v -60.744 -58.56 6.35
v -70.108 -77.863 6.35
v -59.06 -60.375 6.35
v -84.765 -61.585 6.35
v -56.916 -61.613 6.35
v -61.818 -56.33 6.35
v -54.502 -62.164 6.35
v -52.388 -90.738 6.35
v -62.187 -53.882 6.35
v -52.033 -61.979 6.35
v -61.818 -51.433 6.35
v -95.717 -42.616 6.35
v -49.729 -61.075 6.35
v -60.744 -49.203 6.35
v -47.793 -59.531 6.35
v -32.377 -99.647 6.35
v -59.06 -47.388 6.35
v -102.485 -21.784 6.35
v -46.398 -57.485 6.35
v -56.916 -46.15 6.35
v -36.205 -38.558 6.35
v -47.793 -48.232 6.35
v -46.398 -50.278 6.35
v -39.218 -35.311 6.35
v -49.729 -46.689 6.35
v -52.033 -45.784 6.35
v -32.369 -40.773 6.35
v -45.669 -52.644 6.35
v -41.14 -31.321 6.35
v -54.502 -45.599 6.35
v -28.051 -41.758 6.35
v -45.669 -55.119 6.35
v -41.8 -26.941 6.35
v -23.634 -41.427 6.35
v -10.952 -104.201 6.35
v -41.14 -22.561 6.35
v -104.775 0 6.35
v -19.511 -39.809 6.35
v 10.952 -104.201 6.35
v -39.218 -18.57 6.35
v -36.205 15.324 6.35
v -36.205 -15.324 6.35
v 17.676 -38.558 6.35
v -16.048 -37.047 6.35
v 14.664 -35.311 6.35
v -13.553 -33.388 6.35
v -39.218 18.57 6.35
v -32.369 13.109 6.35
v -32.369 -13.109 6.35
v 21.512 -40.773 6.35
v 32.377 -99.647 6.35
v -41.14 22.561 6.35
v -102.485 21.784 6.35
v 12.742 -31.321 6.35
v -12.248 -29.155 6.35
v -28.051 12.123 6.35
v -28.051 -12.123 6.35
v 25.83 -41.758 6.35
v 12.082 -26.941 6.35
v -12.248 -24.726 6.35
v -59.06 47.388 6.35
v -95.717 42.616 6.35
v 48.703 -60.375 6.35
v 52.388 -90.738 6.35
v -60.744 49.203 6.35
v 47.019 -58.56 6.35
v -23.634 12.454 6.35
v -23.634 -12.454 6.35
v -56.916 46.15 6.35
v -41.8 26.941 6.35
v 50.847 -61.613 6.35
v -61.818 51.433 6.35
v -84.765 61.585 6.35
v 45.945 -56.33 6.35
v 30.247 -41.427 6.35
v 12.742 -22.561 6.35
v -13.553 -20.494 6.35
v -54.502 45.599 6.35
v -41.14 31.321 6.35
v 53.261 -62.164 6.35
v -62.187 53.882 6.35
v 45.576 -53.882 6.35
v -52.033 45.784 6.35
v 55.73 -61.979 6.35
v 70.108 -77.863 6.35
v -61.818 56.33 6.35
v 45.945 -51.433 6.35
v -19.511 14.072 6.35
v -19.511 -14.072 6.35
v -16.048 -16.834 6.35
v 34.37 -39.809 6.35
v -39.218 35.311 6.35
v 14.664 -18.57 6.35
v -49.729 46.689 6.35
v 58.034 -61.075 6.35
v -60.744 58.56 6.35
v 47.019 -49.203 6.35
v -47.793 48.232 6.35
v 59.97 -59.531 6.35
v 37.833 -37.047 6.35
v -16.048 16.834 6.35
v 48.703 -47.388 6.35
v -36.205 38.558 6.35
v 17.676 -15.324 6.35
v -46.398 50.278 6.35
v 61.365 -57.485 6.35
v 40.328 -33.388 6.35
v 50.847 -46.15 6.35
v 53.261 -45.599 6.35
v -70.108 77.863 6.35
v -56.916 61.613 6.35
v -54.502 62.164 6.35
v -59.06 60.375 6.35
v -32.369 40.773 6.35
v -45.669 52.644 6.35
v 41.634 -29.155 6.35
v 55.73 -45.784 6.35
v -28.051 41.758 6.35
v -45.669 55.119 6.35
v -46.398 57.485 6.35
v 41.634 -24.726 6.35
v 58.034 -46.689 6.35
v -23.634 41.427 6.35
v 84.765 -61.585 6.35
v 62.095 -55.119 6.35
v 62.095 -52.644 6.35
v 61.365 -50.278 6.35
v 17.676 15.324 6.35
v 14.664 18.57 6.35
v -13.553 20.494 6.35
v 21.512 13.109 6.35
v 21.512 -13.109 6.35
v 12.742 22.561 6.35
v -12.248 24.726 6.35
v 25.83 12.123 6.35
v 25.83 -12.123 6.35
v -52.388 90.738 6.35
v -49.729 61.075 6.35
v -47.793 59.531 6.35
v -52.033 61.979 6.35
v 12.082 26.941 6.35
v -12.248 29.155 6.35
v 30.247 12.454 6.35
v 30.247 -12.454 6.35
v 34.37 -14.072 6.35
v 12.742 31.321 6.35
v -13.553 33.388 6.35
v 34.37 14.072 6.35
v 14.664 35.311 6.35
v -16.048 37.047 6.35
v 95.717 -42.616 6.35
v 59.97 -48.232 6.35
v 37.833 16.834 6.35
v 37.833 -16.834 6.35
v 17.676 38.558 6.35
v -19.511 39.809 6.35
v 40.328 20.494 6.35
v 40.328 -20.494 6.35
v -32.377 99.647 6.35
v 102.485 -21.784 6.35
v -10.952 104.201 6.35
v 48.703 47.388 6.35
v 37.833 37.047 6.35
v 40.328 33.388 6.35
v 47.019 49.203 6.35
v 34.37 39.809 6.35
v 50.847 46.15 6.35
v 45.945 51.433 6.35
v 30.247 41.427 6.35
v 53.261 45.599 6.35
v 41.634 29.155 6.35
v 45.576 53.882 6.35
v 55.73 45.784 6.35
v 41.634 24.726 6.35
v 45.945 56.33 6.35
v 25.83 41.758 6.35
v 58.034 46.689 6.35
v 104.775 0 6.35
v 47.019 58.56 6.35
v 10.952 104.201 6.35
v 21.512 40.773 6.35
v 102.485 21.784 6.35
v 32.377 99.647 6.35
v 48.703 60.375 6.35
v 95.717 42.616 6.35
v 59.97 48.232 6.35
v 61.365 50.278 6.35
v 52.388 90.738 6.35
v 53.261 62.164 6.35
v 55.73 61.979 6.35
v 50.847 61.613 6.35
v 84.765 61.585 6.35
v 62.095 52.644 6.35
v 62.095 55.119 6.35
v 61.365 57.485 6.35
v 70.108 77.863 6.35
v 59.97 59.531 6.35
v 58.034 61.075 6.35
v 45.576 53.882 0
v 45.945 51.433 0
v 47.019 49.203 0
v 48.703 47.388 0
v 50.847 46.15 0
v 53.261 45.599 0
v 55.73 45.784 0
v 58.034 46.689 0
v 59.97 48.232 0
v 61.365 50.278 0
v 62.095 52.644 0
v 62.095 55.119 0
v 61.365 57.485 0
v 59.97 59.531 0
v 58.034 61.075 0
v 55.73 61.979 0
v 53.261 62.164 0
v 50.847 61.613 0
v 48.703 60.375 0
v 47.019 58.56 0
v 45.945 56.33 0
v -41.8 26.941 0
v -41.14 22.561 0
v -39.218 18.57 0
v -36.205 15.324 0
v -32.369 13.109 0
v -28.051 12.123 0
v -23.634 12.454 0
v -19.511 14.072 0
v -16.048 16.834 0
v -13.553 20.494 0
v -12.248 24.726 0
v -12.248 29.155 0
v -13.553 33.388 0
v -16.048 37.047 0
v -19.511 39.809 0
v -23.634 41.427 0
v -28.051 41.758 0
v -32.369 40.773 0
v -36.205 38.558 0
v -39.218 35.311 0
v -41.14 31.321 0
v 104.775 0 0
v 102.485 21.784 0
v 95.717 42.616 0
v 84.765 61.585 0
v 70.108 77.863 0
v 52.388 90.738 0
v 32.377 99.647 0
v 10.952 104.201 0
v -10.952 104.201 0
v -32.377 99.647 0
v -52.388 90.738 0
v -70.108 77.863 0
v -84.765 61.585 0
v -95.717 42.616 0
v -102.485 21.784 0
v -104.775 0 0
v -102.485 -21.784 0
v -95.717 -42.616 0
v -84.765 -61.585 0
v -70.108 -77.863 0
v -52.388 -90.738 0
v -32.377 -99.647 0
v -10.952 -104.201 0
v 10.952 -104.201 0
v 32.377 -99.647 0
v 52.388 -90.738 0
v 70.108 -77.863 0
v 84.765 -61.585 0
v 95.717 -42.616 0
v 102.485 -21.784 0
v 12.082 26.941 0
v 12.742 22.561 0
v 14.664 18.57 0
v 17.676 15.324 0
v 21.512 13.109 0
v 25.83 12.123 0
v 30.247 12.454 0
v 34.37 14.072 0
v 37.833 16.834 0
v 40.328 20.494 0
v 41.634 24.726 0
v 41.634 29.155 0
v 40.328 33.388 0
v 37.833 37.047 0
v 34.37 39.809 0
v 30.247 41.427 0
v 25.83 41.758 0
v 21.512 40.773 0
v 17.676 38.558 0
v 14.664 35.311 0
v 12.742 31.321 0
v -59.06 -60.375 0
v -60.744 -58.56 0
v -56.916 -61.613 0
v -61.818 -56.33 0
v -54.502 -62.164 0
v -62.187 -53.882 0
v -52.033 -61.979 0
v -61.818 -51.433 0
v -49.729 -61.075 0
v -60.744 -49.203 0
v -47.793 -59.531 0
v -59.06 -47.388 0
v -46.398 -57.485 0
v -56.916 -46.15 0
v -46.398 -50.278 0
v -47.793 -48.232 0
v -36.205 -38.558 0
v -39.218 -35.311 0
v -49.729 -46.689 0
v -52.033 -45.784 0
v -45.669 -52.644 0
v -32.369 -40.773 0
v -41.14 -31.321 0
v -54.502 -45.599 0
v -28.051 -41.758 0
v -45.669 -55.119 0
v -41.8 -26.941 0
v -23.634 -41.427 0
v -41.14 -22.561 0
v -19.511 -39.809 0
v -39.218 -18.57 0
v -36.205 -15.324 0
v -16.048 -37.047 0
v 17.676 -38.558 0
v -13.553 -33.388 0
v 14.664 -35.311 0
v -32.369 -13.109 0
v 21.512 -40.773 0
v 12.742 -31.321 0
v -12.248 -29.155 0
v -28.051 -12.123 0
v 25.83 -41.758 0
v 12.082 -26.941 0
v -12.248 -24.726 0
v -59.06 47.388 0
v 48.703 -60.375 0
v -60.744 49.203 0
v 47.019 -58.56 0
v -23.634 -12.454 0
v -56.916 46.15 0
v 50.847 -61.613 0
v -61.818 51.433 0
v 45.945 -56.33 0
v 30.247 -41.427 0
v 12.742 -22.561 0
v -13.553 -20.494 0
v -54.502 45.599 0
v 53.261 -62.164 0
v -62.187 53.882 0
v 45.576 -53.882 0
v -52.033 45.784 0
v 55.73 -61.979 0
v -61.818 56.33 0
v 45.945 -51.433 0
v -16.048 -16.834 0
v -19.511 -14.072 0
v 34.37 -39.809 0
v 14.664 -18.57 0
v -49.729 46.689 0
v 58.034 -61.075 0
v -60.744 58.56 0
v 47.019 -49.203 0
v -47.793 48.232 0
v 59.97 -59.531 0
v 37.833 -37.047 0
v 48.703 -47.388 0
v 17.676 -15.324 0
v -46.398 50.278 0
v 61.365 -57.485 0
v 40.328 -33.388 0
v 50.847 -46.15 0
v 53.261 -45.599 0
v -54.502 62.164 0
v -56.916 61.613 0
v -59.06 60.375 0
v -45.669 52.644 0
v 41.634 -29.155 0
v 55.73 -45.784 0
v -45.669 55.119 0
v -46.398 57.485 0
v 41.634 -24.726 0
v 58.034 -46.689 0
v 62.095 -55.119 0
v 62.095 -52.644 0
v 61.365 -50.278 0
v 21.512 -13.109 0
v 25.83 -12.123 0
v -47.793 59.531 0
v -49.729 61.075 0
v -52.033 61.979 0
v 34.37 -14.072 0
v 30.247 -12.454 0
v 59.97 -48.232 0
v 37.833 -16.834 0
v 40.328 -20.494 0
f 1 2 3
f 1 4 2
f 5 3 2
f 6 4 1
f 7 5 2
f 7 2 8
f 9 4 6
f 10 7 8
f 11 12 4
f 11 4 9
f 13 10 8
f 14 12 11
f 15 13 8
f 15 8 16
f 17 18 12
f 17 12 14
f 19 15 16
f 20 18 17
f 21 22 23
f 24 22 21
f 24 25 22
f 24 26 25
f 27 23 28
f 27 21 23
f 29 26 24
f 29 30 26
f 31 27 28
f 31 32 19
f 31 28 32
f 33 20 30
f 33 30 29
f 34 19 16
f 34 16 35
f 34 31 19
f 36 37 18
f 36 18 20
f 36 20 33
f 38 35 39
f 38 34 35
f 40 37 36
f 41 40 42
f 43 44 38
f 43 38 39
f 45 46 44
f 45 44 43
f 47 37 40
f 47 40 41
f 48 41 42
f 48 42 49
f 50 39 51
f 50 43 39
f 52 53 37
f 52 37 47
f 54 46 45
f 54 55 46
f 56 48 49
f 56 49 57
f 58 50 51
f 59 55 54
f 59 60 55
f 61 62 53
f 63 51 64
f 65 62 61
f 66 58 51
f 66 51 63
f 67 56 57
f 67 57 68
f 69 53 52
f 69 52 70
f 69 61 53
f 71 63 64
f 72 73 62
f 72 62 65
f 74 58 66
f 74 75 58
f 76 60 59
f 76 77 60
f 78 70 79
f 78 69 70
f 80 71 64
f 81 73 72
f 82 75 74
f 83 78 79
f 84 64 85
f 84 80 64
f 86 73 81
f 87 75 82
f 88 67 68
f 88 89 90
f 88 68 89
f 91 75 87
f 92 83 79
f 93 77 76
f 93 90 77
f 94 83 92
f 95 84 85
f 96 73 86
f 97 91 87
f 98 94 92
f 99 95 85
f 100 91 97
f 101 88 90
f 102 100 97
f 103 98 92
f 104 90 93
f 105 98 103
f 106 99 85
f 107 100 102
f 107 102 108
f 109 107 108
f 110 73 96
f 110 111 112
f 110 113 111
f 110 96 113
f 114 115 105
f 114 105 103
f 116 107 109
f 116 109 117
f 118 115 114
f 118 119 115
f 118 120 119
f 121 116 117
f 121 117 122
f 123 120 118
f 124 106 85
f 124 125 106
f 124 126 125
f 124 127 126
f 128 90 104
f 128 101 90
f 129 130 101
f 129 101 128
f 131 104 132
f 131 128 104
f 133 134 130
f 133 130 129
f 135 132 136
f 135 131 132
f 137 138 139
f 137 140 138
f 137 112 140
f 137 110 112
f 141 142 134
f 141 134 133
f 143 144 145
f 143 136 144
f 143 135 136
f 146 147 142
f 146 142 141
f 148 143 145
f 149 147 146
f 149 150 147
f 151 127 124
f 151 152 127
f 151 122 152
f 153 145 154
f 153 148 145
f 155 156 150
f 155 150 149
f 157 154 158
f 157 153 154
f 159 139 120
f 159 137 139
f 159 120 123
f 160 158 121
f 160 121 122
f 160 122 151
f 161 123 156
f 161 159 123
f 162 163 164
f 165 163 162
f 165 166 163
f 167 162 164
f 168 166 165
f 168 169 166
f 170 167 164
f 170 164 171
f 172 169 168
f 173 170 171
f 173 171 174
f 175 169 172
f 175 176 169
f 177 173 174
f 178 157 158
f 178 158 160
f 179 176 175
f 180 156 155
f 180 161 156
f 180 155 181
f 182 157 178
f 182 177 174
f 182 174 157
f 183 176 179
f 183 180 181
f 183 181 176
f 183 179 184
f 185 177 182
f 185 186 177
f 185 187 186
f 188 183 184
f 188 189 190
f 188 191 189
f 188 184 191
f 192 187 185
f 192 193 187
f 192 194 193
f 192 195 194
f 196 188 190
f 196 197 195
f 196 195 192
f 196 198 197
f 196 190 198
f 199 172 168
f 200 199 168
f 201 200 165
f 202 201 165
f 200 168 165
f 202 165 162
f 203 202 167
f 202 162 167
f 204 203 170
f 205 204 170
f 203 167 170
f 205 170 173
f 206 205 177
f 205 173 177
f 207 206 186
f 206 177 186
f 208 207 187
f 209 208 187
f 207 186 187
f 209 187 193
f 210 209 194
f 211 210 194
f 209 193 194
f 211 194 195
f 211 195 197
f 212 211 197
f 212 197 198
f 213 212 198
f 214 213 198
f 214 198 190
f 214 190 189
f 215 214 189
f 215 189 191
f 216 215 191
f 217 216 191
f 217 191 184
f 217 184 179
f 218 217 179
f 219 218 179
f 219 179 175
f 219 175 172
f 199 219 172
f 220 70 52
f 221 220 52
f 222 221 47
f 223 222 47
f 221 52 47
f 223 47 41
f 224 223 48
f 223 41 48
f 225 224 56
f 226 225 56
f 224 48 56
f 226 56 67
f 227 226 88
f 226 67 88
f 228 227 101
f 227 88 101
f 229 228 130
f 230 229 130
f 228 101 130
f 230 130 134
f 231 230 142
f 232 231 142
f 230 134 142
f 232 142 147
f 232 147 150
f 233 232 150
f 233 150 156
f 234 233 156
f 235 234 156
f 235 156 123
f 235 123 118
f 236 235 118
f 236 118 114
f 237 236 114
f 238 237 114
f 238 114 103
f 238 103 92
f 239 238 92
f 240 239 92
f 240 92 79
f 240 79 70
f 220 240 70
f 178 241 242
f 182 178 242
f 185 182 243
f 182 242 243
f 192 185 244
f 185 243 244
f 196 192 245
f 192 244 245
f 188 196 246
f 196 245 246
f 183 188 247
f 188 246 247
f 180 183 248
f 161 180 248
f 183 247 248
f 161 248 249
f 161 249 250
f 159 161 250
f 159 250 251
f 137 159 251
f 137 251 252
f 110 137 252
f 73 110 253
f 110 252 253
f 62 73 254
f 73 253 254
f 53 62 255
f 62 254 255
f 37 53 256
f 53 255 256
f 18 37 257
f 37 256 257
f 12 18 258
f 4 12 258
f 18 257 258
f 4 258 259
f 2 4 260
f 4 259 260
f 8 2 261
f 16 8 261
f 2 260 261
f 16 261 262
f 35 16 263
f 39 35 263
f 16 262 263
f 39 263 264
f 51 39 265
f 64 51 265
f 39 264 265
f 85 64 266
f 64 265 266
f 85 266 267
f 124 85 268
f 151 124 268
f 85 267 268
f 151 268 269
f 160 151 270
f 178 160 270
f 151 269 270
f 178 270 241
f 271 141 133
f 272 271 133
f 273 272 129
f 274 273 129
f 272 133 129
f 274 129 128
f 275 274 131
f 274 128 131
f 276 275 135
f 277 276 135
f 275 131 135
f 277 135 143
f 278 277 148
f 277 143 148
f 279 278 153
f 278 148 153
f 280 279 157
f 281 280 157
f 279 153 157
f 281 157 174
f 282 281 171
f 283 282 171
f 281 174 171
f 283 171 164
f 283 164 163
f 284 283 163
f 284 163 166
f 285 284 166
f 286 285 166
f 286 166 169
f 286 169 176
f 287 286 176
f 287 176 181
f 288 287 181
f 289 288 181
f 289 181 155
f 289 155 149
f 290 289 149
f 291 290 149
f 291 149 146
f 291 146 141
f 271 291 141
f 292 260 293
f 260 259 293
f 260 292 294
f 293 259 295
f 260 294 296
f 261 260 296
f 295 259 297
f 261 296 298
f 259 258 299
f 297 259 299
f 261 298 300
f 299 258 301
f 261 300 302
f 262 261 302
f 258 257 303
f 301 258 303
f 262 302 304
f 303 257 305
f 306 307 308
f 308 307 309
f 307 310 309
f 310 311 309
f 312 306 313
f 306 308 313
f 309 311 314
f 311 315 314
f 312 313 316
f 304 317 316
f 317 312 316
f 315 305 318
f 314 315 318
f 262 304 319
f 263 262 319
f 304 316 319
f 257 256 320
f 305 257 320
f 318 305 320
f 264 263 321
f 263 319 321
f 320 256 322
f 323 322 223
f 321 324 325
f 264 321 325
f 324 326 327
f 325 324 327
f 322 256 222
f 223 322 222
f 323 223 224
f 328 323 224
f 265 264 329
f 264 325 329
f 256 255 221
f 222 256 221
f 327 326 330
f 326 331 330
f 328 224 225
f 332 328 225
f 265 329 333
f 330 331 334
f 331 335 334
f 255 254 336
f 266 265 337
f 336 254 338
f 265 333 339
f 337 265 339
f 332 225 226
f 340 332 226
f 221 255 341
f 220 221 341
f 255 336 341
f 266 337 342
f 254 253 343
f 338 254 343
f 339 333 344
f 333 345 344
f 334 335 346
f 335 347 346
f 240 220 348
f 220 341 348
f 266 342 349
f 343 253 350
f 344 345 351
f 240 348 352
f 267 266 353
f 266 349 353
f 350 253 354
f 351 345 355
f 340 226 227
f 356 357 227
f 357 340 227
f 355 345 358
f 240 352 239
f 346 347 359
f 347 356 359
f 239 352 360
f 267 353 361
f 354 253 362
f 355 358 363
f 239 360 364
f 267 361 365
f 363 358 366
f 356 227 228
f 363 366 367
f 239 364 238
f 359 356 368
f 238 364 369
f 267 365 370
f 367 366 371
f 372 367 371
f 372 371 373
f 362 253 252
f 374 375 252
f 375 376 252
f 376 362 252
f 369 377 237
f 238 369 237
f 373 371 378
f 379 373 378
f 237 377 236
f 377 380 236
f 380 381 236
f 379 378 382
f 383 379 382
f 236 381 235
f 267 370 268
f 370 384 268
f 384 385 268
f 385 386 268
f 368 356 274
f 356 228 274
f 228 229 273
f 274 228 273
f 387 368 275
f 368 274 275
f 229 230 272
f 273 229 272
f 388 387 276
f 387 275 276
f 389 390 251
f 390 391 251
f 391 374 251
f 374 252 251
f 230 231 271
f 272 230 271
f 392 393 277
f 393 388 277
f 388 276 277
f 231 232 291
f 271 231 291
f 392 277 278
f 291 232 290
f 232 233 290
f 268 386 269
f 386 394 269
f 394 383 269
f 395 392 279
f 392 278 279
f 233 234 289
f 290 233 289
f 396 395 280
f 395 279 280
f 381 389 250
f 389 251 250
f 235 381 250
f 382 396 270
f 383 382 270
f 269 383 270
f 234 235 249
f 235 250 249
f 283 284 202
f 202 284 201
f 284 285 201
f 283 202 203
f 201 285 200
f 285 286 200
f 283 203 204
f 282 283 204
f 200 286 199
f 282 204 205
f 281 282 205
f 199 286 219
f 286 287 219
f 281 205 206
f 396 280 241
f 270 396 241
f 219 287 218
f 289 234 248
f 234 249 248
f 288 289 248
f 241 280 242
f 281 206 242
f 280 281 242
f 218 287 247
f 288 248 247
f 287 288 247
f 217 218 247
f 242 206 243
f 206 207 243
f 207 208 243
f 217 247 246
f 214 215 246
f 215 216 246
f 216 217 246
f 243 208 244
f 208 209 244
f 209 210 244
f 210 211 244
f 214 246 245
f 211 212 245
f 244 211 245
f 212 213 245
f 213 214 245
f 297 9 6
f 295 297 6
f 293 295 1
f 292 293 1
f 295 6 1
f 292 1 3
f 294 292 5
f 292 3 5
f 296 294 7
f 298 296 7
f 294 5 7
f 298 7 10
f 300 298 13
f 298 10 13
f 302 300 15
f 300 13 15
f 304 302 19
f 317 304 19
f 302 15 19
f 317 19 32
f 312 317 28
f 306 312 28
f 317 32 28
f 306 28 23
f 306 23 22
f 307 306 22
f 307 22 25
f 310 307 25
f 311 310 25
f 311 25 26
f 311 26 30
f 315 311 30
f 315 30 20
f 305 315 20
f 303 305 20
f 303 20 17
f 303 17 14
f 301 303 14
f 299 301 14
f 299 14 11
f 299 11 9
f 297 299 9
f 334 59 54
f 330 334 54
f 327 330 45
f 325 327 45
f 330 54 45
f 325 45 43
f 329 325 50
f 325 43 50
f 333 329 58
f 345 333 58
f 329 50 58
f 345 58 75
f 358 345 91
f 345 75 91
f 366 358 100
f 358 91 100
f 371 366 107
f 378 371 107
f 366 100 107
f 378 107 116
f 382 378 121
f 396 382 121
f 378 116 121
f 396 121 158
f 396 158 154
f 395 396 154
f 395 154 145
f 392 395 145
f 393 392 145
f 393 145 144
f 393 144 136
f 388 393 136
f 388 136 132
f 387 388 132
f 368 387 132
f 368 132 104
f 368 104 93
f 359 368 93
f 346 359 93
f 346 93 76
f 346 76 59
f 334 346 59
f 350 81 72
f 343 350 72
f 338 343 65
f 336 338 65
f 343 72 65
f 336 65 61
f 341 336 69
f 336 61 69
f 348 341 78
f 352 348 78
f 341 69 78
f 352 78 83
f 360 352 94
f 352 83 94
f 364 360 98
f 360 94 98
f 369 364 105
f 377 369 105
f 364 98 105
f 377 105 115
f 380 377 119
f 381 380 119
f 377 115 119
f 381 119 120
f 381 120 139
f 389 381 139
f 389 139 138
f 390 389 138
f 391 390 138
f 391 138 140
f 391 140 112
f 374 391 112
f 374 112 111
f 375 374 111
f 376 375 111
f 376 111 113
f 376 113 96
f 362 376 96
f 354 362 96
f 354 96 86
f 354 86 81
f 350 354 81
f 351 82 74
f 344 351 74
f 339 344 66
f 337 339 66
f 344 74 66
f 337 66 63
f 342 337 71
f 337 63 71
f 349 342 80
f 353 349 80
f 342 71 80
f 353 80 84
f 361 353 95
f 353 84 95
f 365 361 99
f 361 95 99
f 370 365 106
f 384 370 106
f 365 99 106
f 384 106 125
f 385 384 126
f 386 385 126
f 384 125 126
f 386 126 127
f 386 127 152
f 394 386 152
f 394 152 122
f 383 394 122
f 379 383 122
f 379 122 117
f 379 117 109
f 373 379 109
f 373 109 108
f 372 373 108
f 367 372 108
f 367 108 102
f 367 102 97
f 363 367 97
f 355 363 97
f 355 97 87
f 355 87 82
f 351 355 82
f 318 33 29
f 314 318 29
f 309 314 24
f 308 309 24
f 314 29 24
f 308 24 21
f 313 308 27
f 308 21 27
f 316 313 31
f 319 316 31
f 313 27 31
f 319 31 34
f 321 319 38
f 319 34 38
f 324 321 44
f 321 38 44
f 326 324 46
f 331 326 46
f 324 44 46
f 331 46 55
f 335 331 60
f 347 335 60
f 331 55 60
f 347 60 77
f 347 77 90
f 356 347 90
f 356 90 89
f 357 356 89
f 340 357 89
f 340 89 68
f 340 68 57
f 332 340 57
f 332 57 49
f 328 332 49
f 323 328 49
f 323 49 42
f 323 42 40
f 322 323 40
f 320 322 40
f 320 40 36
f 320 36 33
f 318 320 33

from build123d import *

# Parameters (mm, degrees)
F0_R     = 104.775
F1_DEPTH = 6.35
F2_D     = 29.718
F3_D     = 29.718
F4_D     = 29.718
F5_D     = 29.718
F6_D     = 16.6116
F7_D     = 16.6116
F8_D     = 16.6116
F9_D     = 16.6116


with BuildPart() as f1:
    # F0 (on Top) → F1 (new body)
    with BuildSketch(Plane.XY):
        Circle(F0_R)
    extrude(amount=F1_DEPTH)

    # F2 (through all)
    with Locations(Plane(origin=(0, 0, 0), x_dir=(1, 0, 0), z_dir=(0, 0, -1))):
        with Locations((-26.940768, 26.940768)):
            Hole(F2_D / 2)

    # F3 (through all)
    with Locations(Plane(origin=(0, 0, 0), x_dir=(1, 0, 0), z_dir=(0, 0, -1))):
        with Locations((26.940768, 26.940768)):
            Hole(F3_D / 2)

    # F4 (through all)
    with Locations(Plane(origin=(0, 0, 0), x_dir=(1, 0, 0), z_dir=(0, 0, -1))):
        with Locations((-26.940768, -26.940768)):
            Hole(F4_D / 2)

    # F5 (through all)
    with Locations(Plane(origin=(0, 0, 0), x_dir=(1, 0, 0), z_dir=(0, 0, -1))):
        with Locations((26.940768, -26.940768)):
            Hole(F5_D / 2)

    # F6 (through all)
    with Locations(Plane(origin=(0, 0, 0), x_dir=(1, 0, 0), z_dir=(0, 0, -1))):
        with Locations((-53.881537, 53.881537)):
            Hole(F6_D / 2)

    # F7 (through all)
    with Locations(Plane(origin=(0, 0, 0), x_dir=(1, 0, 0), z_dir=(0, 0, -1))):
        with Locations((53.881537, 53.881537)):
            Hole(F7_D / 2)

    # F8 (through all)
    with Locations(Plane(origin=(0, 0, 0), x_dir=(1, 0, 0), z_dir=(0, 0, -1))):
        with Locations((-53.881537, -53.881537)):
            Hole(F8_D / 2)

    # F9 (through all)
    with Locations(Plane(origin=(0, 0, 0), x_dir=(1, 0, 0), z_dir=(0, 0, -1))):
        with Locations((53.881537, -53.881537)):
            Hole(F9_D / 2)


solid = f1.part
